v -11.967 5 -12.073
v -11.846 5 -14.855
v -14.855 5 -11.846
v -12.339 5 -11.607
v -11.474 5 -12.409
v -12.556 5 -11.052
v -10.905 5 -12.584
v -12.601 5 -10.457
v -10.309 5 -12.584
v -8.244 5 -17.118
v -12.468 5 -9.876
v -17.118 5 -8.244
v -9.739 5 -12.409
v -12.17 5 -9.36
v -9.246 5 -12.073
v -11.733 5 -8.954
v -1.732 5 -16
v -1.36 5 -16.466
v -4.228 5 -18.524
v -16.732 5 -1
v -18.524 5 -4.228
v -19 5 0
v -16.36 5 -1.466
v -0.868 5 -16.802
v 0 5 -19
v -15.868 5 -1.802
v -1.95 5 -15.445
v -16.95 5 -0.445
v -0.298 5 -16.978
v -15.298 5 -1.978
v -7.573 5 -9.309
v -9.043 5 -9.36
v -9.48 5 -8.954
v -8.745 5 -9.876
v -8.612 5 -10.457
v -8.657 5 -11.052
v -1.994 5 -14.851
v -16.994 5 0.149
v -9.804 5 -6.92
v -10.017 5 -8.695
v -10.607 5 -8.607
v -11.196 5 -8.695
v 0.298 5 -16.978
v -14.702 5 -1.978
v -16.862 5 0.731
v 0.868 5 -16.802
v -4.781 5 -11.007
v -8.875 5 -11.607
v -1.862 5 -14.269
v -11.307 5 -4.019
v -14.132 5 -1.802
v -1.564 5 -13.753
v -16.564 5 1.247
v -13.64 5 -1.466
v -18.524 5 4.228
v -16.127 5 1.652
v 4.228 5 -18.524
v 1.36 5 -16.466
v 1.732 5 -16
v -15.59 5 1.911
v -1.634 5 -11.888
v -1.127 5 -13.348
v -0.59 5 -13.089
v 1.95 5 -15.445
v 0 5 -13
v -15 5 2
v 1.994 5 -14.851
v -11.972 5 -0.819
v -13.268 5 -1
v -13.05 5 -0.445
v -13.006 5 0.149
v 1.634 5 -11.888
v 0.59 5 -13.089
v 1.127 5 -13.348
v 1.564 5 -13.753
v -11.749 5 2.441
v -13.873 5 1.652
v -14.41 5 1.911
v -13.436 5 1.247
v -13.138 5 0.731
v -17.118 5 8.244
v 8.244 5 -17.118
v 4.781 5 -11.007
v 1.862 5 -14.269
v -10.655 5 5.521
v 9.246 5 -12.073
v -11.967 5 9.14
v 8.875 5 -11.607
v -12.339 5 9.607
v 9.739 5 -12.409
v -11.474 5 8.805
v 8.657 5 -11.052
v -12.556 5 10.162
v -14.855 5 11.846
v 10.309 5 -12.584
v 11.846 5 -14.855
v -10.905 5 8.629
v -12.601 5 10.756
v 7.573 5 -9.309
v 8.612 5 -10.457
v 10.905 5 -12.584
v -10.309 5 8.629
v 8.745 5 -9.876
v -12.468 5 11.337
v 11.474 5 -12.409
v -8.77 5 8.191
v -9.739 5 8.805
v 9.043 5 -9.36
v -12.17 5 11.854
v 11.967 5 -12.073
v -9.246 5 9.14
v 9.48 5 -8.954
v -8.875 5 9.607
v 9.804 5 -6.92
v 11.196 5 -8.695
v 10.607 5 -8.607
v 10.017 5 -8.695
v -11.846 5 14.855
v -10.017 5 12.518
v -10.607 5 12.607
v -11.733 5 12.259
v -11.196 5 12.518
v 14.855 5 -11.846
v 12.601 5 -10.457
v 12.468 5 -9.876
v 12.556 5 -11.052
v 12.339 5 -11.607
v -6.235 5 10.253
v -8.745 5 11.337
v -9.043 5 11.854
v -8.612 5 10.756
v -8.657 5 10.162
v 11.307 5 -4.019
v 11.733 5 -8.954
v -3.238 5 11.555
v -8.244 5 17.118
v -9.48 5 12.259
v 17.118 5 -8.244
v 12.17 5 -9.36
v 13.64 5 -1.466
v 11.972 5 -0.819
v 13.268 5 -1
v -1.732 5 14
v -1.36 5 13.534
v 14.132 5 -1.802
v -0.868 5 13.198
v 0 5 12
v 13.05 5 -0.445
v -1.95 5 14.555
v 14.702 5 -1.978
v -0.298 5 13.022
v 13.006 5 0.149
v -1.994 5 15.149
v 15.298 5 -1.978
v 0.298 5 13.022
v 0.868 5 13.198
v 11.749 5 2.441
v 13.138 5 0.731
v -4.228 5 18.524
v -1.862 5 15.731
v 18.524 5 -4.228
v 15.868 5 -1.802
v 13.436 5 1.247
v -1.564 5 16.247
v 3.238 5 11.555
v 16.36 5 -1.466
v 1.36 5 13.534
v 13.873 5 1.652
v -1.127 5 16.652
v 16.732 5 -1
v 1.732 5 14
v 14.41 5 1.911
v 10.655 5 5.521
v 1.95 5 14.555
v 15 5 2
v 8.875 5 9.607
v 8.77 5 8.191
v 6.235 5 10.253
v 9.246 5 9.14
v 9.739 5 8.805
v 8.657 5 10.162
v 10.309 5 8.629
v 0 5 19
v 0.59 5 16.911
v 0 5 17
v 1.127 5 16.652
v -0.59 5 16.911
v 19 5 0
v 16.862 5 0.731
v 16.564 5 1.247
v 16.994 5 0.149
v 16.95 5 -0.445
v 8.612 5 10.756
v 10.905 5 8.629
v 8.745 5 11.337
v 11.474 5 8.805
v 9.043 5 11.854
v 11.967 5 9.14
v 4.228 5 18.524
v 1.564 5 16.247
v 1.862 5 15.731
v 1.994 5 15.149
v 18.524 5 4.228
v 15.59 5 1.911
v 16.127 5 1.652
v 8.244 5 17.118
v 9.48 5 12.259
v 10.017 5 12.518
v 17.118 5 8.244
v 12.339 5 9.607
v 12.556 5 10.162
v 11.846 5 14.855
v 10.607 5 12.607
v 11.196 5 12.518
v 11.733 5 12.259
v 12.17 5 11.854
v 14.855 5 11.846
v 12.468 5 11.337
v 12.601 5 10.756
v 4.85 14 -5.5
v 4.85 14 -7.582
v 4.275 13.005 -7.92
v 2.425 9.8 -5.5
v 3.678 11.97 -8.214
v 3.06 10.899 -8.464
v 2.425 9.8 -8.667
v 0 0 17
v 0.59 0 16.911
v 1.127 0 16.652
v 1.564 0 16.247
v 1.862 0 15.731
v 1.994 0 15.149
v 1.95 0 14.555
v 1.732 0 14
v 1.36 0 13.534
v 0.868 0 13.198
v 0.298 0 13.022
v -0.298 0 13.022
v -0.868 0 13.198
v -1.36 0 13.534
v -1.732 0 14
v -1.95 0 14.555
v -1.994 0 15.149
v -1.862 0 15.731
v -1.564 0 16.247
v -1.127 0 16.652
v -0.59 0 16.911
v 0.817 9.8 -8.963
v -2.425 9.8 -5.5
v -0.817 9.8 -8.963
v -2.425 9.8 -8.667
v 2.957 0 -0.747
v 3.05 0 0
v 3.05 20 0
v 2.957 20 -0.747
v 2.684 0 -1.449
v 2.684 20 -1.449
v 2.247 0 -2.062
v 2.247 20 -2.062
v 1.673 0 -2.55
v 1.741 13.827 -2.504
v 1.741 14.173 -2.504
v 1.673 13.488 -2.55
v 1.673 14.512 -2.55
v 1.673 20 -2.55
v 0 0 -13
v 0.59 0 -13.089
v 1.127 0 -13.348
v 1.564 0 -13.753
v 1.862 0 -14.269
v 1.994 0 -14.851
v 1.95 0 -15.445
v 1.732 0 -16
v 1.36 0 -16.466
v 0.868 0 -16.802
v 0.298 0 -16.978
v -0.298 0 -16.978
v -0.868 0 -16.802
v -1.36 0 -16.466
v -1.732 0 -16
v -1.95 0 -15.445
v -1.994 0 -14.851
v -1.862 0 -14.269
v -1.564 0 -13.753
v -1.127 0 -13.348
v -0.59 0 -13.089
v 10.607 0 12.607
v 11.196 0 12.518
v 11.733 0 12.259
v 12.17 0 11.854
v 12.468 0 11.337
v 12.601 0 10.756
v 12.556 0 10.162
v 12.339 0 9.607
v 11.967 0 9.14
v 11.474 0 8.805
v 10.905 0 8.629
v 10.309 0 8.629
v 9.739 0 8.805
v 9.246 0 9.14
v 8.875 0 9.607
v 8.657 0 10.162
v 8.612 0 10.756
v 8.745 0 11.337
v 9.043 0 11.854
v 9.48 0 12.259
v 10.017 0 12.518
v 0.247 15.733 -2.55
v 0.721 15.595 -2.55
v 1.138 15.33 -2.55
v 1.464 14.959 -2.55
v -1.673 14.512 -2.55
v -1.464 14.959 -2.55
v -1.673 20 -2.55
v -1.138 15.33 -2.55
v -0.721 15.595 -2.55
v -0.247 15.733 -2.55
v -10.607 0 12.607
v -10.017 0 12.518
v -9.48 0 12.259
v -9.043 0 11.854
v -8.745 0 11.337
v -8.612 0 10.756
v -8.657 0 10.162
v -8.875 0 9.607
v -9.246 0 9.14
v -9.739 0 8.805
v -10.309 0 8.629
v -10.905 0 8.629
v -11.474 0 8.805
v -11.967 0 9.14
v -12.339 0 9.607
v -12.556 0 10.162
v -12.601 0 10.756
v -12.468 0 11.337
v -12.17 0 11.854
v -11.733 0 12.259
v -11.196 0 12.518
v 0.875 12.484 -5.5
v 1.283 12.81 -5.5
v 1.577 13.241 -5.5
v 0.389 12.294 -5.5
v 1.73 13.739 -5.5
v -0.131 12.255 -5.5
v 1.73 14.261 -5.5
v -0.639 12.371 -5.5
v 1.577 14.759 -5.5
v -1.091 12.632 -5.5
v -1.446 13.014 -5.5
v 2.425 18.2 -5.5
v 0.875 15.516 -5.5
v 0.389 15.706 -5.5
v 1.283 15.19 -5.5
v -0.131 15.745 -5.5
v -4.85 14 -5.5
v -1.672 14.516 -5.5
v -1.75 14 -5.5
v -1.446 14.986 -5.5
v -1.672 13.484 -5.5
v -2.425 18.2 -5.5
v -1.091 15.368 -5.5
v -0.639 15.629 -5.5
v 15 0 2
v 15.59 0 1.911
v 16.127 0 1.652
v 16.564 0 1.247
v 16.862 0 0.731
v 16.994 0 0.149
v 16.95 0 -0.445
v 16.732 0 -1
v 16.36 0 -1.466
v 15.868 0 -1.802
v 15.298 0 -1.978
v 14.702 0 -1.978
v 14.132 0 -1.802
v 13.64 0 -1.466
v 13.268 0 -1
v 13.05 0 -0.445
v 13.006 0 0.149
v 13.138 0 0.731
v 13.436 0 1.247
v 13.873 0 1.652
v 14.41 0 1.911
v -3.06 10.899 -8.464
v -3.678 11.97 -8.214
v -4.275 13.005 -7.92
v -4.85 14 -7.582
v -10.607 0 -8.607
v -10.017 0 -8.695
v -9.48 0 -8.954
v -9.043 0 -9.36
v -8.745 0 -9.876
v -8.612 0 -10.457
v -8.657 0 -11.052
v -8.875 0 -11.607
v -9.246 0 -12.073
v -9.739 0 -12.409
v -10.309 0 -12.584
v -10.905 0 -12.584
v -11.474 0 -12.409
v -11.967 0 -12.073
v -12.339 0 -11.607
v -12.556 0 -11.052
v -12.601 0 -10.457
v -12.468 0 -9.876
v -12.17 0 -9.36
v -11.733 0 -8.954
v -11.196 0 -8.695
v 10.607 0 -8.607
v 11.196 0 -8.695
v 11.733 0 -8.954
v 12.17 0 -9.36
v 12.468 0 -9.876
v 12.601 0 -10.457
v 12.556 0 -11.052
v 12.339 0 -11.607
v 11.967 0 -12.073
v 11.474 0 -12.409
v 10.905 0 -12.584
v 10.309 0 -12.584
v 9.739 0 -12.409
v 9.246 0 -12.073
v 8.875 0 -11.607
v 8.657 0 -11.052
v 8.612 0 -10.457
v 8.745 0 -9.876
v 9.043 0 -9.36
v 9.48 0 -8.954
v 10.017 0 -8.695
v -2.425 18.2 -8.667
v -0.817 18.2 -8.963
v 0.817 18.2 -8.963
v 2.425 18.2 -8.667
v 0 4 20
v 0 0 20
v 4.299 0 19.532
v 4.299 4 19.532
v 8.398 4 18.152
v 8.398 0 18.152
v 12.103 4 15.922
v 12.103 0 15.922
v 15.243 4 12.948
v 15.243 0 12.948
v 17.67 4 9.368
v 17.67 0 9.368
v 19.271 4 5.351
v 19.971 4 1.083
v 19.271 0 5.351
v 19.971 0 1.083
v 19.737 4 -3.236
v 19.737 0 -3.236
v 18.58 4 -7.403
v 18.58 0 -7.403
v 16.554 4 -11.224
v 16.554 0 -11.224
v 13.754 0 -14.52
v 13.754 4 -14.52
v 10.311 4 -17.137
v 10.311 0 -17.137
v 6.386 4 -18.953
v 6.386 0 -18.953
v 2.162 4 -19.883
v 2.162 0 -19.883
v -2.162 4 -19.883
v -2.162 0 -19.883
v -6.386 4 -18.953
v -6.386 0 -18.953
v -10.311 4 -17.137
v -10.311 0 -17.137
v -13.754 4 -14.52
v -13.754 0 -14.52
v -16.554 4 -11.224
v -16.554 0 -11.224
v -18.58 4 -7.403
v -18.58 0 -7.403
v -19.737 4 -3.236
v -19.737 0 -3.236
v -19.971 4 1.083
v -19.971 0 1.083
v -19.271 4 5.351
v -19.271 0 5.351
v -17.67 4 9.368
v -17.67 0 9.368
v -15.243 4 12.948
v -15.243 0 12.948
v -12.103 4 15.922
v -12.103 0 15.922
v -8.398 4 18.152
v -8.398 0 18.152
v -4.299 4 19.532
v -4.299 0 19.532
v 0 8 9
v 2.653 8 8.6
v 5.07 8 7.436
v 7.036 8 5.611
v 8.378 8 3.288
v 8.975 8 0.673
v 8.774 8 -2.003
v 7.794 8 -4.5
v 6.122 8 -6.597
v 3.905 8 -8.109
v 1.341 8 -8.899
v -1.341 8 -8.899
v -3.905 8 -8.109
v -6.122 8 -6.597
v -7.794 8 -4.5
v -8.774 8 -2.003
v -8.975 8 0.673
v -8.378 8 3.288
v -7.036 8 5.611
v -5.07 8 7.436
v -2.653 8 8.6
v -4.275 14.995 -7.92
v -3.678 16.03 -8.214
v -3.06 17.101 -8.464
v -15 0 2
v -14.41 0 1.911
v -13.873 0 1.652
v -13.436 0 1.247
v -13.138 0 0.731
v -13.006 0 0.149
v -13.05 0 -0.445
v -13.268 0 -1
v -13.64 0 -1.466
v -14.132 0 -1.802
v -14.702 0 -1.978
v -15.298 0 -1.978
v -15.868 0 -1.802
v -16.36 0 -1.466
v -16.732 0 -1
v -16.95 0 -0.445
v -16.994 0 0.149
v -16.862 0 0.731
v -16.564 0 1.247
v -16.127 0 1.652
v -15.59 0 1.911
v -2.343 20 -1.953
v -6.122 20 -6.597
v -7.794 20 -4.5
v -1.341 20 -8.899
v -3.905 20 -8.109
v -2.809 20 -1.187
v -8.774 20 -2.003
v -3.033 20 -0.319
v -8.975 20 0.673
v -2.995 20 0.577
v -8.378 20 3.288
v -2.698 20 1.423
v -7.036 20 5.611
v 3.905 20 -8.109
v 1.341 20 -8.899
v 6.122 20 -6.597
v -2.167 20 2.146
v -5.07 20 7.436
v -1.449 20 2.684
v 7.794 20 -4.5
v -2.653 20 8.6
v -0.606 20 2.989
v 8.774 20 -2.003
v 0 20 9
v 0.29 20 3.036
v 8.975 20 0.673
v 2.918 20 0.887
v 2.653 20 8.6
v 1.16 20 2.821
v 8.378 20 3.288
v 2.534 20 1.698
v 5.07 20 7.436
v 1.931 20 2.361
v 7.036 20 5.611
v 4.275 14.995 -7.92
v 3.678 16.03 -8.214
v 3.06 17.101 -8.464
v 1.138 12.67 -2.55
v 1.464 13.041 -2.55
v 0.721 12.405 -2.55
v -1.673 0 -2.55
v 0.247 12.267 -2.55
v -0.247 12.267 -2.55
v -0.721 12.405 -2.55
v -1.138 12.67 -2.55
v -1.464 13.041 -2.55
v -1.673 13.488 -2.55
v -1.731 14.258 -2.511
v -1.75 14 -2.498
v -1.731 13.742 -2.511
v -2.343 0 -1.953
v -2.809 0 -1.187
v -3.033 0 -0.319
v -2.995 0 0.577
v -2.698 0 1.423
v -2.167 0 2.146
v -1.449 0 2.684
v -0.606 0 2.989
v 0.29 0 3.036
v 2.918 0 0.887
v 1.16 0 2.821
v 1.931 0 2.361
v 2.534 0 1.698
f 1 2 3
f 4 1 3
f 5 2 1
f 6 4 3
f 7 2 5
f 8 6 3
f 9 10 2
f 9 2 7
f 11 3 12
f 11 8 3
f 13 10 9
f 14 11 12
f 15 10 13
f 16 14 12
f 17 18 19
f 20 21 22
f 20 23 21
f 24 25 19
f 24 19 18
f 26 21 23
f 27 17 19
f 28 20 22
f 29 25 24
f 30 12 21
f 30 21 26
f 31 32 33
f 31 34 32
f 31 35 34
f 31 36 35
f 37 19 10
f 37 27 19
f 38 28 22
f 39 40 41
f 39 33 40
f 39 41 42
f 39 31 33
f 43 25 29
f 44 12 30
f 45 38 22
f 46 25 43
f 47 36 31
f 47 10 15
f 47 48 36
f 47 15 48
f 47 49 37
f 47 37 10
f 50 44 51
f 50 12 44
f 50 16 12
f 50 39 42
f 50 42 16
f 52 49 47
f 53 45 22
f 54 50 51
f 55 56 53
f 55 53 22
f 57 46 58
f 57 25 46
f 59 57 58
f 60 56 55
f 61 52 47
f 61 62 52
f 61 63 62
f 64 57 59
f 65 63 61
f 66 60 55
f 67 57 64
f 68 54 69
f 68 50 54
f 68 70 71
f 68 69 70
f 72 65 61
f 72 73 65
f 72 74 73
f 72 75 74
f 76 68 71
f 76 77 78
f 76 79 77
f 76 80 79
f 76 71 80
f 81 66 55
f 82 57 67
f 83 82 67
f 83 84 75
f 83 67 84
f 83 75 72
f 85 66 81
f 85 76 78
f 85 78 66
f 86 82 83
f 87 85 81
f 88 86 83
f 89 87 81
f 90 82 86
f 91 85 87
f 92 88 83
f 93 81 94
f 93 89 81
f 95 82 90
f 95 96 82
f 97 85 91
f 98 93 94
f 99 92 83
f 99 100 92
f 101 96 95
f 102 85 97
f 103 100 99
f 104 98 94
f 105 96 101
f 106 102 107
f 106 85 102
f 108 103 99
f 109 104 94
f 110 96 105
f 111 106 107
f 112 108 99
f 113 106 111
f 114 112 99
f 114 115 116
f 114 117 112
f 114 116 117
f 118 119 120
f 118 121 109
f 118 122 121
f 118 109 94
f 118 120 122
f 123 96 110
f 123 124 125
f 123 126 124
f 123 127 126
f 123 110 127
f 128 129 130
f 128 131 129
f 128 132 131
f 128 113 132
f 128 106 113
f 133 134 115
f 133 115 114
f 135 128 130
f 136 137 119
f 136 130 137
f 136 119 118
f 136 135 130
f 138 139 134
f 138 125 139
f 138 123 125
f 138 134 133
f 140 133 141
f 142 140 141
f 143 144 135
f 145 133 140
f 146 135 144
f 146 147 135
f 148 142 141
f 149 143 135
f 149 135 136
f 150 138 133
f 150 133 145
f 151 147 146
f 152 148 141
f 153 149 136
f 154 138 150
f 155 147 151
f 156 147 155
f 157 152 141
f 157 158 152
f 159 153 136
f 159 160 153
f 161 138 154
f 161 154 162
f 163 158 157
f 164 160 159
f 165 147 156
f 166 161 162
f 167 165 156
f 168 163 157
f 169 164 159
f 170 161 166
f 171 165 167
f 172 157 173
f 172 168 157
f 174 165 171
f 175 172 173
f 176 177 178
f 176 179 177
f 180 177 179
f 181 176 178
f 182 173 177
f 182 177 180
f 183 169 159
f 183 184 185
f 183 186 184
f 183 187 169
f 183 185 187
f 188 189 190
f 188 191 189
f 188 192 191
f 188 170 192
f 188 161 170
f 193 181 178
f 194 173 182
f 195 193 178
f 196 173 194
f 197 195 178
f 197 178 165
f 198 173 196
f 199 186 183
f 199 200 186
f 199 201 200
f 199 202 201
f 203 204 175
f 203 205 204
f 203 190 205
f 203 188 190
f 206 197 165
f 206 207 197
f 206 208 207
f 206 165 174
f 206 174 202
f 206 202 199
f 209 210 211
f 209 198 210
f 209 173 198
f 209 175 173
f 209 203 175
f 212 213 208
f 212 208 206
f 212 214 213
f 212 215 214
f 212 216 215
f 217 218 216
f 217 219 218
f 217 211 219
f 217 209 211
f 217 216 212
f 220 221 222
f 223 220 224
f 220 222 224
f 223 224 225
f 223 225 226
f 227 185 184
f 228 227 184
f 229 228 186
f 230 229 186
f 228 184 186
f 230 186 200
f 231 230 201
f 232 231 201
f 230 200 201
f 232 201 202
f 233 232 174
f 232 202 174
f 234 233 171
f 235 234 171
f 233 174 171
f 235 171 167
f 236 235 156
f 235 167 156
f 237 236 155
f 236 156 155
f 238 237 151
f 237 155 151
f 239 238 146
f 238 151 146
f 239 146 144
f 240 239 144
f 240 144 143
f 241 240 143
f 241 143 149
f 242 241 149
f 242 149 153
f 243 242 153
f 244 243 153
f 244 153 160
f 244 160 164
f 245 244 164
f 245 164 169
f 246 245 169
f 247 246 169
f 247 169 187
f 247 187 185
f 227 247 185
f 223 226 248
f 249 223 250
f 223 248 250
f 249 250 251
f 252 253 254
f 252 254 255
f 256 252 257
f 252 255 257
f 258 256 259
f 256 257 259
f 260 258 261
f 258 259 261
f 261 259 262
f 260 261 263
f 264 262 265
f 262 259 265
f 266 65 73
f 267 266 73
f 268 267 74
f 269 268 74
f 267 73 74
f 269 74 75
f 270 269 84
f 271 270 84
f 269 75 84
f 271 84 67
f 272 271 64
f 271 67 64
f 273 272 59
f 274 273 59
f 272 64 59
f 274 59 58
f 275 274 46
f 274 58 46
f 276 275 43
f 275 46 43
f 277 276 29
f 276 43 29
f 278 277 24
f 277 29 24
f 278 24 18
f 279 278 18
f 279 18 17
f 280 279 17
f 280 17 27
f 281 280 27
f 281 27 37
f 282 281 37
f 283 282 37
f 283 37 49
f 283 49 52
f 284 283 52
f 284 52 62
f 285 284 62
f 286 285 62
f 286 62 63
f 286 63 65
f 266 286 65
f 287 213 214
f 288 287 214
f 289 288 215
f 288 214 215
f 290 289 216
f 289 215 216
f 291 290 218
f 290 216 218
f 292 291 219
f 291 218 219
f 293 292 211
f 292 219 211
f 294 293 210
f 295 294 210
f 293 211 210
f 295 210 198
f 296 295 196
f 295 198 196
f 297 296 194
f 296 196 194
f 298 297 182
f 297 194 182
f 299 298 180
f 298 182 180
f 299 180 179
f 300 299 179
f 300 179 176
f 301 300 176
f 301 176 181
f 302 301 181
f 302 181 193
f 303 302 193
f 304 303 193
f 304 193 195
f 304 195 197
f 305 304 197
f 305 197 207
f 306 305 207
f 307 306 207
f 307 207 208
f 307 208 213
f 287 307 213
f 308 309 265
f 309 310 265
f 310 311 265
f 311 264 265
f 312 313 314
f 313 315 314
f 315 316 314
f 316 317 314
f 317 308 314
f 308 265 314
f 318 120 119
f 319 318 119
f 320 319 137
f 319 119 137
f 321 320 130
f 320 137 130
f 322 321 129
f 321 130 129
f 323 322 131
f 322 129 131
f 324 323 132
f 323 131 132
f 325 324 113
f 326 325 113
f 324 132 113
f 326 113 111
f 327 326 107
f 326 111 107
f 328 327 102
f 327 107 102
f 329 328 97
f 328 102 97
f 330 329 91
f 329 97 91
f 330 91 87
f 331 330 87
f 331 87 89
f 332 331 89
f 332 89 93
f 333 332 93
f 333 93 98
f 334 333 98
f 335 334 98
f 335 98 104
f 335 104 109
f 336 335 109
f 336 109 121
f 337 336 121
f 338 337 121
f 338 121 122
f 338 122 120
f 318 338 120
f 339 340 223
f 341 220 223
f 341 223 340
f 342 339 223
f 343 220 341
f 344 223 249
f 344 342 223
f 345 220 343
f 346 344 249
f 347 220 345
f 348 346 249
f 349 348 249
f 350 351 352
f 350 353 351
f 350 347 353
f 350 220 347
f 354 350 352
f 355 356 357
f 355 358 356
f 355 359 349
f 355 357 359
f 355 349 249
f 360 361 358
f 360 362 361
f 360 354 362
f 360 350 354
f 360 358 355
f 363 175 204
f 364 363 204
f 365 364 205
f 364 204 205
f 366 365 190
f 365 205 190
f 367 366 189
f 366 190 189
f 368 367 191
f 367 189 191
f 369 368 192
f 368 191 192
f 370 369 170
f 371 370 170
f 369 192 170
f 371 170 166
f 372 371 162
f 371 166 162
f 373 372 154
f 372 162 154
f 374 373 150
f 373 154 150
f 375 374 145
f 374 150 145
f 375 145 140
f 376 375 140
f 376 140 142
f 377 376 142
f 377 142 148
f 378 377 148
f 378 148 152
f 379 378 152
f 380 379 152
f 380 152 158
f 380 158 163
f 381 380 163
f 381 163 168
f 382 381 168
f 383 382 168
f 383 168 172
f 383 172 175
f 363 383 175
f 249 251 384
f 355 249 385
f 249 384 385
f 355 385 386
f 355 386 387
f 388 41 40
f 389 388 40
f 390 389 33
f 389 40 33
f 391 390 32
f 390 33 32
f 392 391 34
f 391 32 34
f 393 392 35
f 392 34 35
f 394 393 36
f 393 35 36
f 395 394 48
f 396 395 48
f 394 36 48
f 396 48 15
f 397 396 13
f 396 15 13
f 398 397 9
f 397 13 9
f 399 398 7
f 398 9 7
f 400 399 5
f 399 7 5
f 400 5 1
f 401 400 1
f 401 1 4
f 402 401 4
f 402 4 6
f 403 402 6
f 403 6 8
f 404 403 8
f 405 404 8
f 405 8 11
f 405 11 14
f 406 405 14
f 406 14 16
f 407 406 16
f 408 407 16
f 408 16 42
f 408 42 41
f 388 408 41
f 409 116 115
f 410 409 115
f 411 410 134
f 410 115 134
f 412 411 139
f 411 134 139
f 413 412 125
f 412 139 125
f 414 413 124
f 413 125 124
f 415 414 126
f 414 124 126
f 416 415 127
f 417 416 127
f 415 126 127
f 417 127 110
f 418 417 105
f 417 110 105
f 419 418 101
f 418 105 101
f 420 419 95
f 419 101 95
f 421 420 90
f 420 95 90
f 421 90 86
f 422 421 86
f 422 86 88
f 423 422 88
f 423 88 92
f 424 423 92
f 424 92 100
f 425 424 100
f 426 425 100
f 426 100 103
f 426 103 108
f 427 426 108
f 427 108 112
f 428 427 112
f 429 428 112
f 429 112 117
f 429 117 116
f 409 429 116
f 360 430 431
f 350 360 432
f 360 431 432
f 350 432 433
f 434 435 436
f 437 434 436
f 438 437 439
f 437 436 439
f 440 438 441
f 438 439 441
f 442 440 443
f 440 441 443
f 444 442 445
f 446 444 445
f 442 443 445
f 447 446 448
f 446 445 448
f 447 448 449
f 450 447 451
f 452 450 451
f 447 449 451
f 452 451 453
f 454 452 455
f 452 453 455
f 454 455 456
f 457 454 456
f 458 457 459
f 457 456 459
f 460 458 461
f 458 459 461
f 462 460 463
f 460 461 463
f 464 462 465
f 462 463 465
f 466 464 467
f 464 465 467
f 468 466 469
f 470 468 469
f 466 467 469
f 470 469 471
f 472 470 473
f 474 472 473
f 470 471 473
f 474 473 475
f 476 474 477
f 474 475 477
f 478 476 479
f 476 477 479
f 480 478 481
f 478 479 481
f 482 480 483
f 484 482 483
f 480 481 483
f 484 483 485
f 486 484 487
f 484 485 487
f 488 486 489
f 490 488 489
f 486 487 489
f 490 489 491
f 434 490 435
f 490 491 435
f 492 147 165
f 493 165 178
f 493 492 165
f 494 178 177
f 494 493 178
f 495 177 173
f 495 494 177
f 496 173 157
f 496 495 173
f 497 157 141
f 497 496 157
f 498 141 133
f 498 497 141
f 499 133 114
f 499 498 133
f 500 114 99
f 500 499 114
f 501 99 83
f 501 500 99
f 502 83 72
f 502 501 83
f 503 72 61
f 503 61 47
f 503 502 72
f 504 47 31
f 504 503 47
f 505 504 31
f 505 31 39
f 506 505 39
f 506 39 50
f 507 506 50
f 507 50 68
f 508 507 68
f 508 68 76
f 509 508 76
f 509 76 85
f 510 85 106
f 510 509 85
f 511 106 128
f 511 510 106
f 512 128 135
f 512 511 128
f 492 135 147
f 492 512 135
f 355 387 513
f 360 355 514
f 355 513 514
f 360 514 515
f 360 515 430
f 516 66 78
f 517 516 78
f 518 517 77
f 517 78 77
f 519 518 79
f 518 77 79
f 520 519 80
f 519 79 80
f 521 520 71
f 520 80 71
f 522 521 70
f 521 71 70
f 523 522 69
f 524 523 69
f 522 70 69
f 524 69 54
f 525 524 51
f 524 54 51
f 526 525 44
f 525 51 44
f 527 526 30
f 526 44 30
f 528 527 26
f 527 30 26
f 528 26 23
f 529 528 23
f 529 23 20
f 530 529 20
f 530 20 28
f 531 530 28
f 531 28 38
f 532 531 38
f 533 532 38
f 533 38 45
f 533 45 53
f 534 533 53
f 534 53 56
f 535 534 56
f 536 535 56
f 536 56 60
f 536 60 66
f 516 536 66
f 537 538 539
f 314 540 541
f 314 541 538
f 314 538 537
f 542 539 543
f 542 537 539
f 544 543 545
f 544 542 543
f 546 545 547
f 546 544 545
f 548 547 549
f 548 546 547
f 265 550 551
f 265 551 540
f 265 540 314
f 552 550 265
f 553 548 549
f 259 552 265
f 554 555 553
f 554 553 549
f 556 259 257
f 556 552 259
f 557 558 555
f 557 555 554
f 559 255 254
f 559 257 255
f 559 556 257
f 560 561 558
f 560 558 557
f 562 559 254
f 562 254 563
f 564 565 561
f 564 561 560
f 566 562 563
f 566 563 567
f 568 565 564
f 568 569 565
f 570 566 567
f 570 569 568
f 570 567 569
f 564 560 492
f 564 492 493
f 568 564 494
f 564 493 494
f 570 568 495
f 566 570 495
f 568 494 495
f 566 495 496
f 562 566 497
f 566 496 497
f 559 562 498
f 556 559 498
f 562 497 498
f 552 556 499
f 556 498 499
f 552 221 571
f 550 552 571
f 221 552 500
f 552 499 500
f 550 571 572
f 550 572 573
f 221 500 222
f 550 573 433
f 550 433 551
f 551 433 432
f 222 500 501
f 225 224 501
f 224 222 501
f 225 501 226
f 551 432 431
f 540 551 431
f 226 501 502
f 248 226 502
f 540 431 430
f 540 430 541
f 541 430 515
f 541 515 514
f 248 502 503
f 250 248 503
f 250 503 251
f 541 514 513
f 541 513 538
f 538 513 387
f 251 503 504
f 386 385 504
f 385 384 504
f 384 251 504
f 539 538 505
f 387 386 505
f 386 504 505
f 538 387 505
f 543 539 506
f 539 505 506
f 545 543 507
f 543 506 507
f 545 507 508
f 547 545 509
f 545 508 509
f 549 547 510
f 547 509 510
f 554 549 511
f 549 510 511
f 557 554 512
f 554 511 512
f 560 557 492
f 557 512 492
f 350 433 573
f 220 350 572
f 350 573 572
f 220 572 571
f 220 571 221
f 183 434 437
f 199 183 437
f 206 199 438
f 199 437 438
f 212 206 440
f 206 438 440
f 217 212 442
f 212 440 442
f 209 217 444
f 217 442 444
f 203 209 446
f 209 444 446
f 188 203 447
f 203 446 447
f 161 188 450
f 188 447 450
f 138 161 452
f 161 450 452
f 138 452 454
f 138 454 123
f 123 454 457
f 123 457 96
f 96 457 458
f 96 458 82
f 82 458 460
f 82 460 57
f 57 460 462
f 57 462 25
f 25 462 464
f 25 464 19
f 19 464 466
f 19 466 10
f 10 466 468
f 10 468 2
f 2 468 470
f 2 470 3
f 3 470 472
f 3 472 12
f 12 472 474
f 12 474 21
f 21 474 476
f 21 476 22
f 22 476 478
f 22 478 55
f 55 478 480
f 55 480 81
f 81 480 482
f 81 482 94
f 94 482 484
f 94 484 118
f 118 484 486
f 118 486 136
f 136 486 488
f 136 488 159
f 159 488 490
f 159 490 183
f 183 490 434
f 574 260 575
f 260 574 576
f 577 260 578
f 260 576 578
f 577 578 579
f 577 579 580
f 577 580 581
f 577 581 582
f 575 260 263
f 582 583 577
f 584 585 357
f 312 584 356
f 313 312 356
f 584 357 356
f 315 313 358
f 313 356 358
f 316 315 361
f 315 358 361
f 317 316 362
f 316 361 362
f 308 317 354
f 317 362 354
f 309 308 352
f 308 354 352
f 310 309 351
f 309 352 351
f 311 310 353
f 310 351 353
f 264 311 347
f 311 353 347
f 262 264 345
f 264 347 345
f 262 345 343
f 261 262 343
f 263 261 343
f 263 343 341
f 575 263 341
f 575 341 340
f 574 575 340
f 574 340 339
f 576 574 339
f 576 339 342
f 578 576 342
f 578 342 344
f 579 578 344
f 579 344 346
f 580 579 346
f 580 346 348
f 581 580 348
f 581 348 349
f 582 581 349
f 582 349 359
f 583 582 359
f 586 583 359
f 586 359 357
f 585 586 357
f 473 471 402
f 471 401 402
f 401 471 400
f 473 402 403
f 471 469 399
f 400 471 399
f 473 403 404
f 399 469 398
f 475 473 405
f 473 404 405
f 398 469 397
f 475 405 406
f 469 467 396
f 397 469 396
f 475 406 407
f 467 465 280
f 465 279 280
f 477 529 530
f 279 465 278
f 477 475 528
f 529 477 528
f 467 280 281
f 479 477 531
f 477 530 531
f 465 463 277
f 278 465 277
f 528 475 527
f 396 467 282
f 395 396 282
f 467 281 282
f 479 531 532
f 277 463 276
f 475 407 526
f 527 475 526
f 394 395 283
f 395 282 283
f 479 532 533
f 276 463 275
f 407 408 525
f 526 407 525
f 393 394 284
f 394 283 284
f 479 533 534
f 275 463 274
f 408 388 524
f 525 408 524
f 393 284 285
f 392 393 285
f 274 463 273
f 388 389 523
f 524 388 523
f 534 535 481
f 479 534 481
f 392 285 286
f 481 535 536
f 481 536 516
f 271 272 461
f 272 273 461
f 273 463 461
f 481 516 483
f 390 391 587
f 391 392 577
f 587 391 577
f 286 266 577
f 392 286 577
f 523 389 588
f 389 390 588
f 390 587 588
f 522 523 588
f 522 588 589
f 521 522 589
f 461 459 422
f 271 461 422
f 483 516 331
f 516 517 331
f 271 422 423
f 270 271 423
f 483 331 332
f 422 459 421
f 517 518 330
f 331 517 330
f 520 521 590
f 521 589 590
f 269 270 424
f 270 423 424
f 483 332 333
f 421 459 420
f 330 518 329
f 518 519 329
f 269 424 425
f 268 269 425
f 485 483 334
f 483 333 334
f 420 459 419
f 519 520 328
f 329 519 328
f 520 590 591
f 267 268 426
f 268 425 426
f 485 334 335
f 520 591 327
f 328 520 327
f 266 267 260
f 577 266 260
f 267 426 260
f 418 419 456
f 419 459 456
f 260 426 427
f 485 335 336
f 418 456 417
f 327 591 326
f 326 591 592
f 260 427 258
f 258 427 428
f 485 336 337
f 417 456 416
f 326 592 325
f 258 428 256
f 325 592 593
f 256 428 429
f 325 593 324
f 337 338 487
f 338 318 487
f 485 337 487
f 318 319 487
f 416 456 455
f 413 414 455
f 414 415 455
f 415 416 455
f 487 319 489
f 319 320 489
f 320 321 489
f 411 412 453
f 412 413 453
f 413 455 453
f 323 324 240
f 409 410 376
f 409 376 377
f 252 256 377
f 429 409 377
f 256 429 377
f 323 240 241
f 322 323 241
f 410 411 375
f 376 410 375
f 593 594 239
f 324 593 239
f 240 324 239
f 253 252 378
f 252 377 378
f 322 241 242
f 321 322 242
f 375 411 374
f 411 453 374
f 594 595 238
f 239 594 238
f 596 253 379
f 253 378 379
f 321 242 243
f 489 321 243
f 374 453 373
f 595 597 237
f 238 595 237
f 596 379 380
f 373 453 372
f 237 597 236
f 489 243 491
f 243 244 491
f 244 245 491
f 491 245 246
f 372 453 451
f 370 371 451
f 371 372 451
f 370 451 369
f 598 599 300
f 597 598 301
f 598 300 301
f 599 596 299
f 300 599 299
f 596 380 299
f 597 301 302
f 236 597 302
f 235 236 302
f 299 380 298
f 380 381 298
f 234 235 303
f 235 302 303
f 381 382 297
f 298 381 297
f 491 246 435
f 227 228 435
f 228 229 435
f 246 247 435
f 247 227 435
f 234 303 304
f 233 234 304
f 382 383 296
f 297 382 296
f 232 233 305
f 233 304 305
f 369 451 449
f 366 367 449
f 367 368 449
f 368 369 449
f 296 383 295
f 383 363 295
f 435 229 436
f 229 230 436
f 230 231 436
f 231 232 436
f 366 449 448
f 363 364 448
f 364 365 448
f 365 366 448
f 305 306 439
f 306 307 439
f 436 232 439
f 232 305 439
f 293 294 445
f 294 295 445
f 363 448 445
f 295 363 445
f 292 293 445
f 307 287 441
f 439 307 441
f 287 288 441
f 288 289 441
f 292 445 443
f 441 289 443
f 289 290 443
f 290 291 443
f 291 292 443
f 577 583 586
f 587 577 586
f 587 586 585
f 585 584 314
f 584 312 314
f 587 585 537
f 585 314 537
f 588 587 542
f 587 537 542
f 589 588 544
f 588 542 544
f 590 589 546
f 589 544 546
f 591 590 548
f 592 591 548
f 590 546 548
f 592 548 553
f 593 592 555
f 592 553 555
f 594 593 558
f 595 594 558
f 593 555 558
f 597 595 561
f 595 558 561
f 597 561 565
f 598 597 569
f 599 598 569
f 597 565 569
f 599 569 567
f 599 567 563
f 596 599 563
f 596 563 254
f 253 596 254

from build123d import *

# Parameters (mm, degrees)
SKETCH1_R           = 20
BOSS_EXTRUDE1_DEPTH = 5
SKETCH2_R           = 2
CUT_EXTRUDE1_DEPTH  = 29.722813233
SKETCH3_R           = 9
BOSS_EXTRUDE2_DEPTH = 15
CUT_EXTRUDE2_DEPTH  = 35.641016151
CHAMFER3_SIZE       = 3
CHAMFER4_SIZE       = 1
CUT_EXTRUDE7_DEPTH  = 3.5
CUT_EXTRUDE8_REACH  = 42.509
SKETCH10_3_R        = 1.75


with BuildPart() as part:
    # Sketch1 → Boss-Extrude1 (new body)
    with BuildSketch(Plane(origin=(0, 0, 0), x_dir=(1, 0, 0), z_dir=(0, 1, 0))):
        Circle(SKETCH1_R)
    extrude(amount=BOSS_EXTRUDE1_DEPTH)

    # Sketch2 → Cut-Extrude1 (cut, through all)
    with BuildSketch(Plane(origin=(0, 5, 0), x_dir=(1, 0, 0), z_dir=(0, 1, 0))):
        with Locations((0, 15)):
            Circle(SKETCH2_R)
        with Locations((10.606601718, 10.606601718)):
            Circle(SKETCH2_R)
        with Locations((15, 0)):
            Circle(SKETCH2_R)
        with Locations((10.606601718, -10.606601718)):
            Circle(SKETCH2_R)
        with Locations((0, -15)):
            Circle(SKETCH2_R)
        with Locations((-10.606601718, -10.606601718)):
            Circle(SKETCH2_R)
        with Locations((-15, 0)):
            Circle(SKETCH2_R)
        with Locations((-10.606601718, 10.606601718)):
            Circle(SKETCH2_R)
    extrude(amount=-CUT_EXTRUDE1_DEPTH, mode=Mode.SUBTRACT)

    # Sketch3 → Boss-Extrude2 (add)
    with BuildSketch(Plane(origin=(0, 5, 0), x_dir=(1, 0, 0), z_dir=(0, 1, 0))):
        Circle(SKETCH3_R)
    extrude(amount=BOSS_EXTRUDE2_DEPTH)

    # Sketch4 → Cut-Extrude2 (cut, through all)
    with BuildSketch(Plane(origin=(0, 20, 0), x_dir=(1, 0, 0), z_dir=(0, 1, 0))):
        with BuildLine():
            Line((1.673320053, 2.55), (-1.673320053, 2.55))
            ThreePointArc((-1.673320053, 2.55), (-1.44894338, -2.683852284), (3.05, 0))
            ThreePointArc((3.05, 0), (2.683852284, 1.44894338), (1.673320053, 2.55))
        make_face()
    extrude(amount=-CUT_EXTRUDE2_DEPTH, mode=Mode.SUBTRACT)

    # Chamfer3
    chamfer3_edges = [part.edges().sort_by_distance(p)[0] for p in [
        (-9, 5, 0),
    ]]
    chamfer(chamfer3_edges, length=CHAMFER3_SIZE)

    # Chamfer4
    chamfer4_edges = [part.edges().sort_by_distance(p)[0] for p in [
        (-20, 5, 0),
    ]]
    chamfer(chamfer4_edges, length=CHAMFER4_SIZE)

    # Sketch10 → Cut-Extrude7 (cut)
    with BuildSketch(Plane(origin=(0, 0, -9), x_dir=(-1, 0, 0), z_dir=(0, 0, -1))):
        Polygon((4.849742261, 14), (2.424871131, 18.2), (-2.424871131, 18.2), (-4.849742261, 14), (-2.424871131, 9.8), (2.424871131, 9.8), align=None)
    extrude(amount=-CUT_EXTRUDE7_DEPTH, mode=Mode.SUBTRACT)

    # Sketch10<3> → Cut-Extrude8 (cut, up to next)
    with BuildSketch(Plane(origin=(0, 0, -9), x_dir=(-1, 0, 0), z_dir=(0, 0, -1)), mode=Mode.PRIVATE) as cut_extrude8_sk1:
        with Locations((0, 14)):
            Circle(SKETCH10_3_R)
    cut_extrude8_tool1 = extrude(cut_extrude8_sk1.sketch, amount=-CUT_EXTRUDE8_REACH, mode=Mode.PRIVATE) & part.part
    add(cut_extrude8_tool1.solids().sort_by_distance((0, 14, -9))[0], mode=Mode.SUBTRACT)


solid = part.part
